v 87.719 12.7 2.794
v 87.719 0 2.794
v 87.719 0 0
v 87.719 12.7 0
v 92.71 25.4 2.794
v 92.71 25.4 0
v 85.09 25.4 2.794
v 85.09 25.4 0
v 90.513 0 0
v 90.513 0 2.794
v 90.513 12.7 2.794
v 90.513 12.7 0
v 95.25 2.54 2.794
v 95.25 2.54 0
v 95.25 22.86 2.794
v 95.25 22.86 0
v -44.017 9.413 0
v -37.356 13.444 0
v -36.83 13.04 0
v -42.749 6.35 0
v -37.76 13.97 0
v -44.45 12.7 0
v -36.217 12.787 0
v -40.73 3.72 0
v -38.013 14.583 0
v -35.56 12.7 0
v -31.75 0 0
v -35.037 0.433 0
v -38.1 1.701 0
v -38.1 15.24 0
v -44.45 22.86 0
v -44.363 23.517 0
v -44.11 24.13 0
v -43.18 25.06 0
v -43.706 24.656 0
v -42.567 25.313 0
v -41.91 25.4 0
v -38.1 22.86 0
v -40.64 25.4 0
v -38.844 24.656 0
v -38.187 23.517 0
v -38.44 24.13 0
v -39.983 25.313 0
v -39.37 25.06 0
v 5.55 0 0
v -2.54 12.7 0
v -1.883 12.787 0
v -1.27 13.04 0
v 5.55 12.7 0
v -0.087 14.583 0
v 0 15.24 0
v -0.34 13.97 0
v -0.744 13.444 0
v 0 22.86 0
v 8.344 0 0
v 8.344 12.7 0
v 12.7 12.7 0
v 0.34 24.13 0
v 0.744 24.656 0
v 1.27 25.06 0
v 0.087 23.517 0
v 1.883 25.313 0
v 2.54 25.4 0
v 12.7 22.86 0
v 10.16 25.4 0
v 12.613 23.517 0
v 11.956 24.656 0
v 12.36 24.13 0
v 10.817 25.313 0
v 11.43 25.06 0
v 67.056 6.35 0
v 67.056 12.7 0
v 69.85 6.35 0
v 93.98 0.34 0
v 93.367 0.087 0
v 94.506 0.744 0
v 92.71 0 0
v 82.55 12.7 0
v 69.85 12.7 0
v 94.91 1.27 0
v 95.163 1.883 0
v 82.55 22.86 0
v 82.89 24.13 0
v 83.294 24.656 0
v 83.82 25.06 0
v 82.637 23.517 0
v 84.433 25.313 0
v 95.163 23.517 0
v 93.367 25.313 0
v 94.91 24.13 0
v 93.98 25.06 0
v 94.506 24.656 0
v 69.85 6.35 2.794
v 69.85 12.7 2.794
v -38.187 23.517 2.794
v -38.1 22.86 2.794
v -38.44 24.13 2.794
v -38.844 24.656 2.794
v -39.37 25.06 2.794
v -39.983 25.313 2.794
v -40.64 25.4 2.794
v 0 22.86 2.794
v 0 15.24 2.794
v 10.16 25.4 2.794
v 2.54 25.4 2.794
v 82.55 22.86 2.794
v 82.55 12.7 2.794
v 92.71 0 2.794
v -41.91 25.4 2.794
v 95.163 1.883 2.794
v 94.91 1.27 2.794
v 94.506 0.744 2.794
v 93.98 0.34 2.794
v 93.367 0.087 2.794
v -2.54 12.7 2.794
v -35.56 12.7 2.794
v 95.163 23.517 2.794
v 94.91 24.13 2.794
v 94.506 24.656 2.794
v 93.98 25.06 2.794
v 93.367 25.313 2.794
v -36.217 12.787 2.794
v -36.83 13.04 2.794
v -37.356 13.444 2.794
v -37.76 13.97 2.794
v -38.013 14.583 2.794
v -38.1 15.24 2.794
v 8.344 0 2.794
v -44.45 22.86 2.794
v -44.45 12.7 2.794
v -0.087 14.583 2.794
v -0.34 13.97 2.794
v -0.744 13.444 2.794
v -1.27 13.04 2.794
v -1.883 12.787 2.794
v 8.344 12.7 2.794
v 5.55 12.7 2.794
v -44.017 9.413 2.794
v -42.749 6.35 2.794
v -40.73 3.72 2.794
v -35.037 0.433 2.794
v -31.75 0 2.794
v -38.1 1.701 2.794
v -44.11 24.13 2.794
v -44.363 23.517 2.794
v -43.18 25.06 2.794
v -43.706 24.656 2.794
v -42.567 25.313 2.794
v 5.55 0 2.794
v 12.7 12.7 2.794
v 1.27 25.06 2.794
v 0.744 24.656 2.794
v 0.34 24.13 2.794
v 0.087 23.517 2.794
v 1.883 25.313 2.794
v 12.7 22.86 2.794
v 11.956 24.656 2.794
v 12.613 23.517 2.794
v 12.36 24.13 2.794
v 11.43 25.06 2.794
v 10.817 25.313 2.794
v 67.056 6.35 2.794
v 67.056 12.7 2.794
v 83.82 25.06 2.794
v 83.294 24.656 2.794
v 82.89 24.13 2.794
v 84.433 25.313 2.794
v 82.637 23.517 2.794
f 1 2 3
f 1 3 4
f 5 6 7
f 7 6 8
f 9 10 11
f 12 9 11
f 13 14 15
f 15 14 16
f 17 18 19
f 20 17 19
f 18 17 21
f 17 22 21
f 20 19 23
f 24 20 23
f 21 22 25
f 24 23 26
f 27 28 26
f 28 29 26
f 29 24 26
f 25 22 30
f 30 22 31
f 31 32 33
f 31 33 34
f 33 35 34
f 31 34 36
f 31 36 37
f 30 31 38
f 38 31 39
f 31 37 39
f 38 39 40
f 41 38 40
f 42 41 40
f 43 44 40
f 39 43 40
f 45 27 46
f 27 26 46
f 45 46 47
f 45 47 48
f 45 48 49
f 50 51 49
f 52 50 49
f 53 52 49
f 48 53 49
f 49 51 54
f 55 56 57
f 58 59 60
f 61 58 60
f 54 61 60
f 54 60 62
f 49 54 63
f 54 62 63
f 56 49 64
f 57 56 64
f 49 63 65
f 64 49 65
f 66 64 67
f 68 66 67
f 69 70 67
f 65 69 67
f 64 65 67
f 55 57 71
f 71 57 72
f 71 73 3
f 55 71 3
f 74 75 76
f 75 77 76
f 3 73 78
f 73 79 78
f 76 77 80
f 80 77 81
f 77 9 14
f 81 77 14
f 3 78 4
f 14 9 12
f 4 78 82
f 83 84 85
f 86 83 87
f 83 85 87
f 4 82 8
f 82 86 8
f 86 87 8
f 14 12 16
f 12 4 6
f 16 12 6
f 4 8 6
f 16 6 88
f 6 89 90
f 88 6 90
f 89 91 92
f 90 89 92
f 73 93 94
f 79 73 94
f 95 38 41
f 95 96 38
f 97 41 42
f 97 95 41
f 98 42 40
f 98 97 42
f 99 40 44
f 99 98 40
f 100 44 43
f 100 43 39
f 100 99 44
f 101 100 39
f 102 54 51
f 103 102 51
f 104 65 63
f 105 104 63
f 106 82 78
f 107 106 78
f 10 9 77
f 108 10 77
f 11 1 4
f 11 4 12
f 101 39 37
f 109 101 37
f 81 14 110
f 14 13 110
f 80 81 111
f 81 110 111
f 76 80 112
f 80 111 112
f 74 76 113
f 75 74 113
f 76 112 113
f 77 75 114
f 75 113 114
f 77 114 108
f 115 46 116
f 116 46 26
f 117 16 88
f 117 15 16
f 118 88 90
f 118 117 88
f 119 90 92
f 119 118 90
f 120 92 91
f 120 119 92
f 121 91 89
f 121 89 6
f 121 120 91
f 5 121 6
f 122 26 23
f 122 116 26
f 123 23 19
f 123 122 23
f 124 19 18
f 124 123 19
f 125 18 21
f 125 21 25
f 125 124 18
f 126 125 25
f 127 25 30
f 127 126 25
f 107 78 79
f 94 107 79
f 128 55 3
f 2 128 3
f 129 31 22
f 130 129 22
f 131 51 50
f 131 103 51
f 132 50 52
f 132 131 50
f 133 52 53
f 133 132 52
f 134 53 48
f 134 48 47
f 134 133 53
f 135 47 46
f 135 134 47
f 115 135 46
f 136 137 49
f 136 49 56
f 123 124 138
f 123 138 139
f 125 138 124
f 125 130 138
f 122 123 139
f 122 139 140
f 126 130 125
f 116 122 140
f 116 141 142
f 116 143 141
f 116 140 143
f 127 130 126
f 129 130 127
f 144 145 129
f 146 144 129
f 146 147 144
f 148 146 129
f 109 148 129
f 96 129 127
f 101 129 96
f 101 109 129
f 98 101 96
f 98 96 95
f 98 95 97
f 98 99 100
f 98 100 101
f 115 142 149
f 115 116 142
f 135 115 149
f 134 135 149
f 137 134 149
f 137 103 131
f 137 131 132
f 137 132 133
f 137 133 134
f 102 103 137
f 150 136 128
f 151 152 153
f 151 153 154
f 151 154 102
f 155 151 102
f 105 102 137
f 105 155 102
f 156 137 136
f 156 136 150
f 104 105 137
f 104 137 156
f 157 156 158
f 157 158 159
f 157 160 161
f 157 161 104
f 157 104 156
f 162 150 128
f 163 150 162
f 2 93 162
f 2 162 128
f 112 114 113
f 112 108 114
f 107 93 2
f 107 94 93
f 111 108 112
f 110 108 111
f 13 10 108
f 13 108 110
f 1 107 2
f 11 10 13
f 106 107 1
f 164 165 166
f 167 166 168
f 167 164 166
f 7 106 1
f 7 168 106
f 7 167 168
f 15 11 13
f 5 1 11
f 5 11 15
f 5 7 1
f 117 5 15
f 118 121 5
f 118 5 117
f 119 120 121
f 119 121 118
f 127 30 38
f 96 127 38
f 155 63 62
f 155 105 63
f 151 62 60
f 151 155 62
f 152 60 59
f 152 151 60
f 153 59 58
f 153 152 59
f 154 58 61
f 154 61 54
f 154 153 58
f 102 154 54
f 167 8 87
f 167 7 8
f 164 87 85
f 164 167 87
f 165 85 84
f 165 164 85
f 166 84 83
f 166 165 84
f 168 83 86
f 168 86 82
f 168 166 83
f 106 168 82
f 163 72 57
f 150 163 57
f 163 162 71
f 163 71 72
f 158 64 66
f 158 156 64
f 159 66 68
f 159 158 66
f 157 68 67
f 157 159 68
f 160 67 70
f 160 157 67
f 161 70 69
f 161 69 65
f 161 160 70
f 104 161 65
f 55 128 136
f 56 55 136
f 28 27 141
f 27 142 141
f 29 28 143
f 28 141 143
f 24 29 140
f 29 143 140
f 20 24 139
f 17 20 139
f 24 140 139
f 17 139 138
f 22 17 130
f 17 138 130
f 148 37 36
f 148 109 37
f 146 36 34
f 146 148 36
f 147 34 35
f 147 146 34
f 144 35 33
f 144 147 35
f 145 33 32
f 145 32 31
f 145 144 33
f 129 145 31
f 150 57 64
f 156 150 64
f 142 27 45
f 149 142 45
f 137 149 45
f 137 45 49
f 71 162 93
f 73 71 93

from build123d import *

# Parameters (mm, degrees)
BOSS_EXTRUDE1_DEPTH = 2.794
FILLET1_R           = 2.54
SKETCH2_W           = 2.794
SKETCH2_H           = 12.7
SKETCH2_H_2         = 6.35
CUT_EXTRUDE1_DEPTH  = 99.618096392
FILLET2_R           = 12.7


with BuildPart() as part:
    # Sketch1 → Boss-Extrude1 (new body)
    with BuildSketch(Plane.XY):
        Polygon((0, 0), (95.25, 0), (95.25, 25.4), (82.55, 25.4), (82.55, 12.7), (12.7, 12.7), (12.7, 25.4), (0, 25.4), (0, 12.7), (-38.1, 12.7), (-38.1, 25.4), (-44.45, 25.4), (-44.45, 0), align=None)
    extrude(amount=BOSS_EXTRUDE1_DEPTH)

    # Fillet1
    fillet1_edges = [part.edges().sort_by_distance(p)[0] for p in [
        (-44.45, 25.4, 1.397),
        (-38.1, 25.4, 1.397),
        (-38.1, 12.7, 1.397),
        (0, 12.7, 1.397),
        (0, 25.4, 1.397),
        (12.7, 25.4, 1.397),
        (82.55, 25.4, 1.397),
        (95.25, 25.4, 1.397),
        (95.25, 0, 1.397),
    ]]
    fillet(fillet1_edges, radius=FILLET1_R)

    # Sketch2 → Cut-Extrude1 (cut, through all)
    with BuildSketch(Plane.XY.offset(2.794)):
        with Locations((89.115859958, 6.35)):
            Rectangle(SKETCH2_W, SKETCH2_H)
        with Locations((6.946859958, 6.35)):
            Rectangle(SKETCH2_W, SKETCH2_H)
        with Locations((68.453, 9.525)):
            Rectangle(SKETCH2_W, SKETCH2_H_2)
    extrude(amount=-CUT_EXTRUDE1_DEPTH, mode=Mode.SUBTRACT)

    # Fillet2
    fillet2_edges = [part.edges().sort_by_distance(p)[0] for p in [
        (-44.45, 0, 1.397),
    ]]
    fillet(fillet2_edges, radius=FILLET2_R)


solid = part.part
